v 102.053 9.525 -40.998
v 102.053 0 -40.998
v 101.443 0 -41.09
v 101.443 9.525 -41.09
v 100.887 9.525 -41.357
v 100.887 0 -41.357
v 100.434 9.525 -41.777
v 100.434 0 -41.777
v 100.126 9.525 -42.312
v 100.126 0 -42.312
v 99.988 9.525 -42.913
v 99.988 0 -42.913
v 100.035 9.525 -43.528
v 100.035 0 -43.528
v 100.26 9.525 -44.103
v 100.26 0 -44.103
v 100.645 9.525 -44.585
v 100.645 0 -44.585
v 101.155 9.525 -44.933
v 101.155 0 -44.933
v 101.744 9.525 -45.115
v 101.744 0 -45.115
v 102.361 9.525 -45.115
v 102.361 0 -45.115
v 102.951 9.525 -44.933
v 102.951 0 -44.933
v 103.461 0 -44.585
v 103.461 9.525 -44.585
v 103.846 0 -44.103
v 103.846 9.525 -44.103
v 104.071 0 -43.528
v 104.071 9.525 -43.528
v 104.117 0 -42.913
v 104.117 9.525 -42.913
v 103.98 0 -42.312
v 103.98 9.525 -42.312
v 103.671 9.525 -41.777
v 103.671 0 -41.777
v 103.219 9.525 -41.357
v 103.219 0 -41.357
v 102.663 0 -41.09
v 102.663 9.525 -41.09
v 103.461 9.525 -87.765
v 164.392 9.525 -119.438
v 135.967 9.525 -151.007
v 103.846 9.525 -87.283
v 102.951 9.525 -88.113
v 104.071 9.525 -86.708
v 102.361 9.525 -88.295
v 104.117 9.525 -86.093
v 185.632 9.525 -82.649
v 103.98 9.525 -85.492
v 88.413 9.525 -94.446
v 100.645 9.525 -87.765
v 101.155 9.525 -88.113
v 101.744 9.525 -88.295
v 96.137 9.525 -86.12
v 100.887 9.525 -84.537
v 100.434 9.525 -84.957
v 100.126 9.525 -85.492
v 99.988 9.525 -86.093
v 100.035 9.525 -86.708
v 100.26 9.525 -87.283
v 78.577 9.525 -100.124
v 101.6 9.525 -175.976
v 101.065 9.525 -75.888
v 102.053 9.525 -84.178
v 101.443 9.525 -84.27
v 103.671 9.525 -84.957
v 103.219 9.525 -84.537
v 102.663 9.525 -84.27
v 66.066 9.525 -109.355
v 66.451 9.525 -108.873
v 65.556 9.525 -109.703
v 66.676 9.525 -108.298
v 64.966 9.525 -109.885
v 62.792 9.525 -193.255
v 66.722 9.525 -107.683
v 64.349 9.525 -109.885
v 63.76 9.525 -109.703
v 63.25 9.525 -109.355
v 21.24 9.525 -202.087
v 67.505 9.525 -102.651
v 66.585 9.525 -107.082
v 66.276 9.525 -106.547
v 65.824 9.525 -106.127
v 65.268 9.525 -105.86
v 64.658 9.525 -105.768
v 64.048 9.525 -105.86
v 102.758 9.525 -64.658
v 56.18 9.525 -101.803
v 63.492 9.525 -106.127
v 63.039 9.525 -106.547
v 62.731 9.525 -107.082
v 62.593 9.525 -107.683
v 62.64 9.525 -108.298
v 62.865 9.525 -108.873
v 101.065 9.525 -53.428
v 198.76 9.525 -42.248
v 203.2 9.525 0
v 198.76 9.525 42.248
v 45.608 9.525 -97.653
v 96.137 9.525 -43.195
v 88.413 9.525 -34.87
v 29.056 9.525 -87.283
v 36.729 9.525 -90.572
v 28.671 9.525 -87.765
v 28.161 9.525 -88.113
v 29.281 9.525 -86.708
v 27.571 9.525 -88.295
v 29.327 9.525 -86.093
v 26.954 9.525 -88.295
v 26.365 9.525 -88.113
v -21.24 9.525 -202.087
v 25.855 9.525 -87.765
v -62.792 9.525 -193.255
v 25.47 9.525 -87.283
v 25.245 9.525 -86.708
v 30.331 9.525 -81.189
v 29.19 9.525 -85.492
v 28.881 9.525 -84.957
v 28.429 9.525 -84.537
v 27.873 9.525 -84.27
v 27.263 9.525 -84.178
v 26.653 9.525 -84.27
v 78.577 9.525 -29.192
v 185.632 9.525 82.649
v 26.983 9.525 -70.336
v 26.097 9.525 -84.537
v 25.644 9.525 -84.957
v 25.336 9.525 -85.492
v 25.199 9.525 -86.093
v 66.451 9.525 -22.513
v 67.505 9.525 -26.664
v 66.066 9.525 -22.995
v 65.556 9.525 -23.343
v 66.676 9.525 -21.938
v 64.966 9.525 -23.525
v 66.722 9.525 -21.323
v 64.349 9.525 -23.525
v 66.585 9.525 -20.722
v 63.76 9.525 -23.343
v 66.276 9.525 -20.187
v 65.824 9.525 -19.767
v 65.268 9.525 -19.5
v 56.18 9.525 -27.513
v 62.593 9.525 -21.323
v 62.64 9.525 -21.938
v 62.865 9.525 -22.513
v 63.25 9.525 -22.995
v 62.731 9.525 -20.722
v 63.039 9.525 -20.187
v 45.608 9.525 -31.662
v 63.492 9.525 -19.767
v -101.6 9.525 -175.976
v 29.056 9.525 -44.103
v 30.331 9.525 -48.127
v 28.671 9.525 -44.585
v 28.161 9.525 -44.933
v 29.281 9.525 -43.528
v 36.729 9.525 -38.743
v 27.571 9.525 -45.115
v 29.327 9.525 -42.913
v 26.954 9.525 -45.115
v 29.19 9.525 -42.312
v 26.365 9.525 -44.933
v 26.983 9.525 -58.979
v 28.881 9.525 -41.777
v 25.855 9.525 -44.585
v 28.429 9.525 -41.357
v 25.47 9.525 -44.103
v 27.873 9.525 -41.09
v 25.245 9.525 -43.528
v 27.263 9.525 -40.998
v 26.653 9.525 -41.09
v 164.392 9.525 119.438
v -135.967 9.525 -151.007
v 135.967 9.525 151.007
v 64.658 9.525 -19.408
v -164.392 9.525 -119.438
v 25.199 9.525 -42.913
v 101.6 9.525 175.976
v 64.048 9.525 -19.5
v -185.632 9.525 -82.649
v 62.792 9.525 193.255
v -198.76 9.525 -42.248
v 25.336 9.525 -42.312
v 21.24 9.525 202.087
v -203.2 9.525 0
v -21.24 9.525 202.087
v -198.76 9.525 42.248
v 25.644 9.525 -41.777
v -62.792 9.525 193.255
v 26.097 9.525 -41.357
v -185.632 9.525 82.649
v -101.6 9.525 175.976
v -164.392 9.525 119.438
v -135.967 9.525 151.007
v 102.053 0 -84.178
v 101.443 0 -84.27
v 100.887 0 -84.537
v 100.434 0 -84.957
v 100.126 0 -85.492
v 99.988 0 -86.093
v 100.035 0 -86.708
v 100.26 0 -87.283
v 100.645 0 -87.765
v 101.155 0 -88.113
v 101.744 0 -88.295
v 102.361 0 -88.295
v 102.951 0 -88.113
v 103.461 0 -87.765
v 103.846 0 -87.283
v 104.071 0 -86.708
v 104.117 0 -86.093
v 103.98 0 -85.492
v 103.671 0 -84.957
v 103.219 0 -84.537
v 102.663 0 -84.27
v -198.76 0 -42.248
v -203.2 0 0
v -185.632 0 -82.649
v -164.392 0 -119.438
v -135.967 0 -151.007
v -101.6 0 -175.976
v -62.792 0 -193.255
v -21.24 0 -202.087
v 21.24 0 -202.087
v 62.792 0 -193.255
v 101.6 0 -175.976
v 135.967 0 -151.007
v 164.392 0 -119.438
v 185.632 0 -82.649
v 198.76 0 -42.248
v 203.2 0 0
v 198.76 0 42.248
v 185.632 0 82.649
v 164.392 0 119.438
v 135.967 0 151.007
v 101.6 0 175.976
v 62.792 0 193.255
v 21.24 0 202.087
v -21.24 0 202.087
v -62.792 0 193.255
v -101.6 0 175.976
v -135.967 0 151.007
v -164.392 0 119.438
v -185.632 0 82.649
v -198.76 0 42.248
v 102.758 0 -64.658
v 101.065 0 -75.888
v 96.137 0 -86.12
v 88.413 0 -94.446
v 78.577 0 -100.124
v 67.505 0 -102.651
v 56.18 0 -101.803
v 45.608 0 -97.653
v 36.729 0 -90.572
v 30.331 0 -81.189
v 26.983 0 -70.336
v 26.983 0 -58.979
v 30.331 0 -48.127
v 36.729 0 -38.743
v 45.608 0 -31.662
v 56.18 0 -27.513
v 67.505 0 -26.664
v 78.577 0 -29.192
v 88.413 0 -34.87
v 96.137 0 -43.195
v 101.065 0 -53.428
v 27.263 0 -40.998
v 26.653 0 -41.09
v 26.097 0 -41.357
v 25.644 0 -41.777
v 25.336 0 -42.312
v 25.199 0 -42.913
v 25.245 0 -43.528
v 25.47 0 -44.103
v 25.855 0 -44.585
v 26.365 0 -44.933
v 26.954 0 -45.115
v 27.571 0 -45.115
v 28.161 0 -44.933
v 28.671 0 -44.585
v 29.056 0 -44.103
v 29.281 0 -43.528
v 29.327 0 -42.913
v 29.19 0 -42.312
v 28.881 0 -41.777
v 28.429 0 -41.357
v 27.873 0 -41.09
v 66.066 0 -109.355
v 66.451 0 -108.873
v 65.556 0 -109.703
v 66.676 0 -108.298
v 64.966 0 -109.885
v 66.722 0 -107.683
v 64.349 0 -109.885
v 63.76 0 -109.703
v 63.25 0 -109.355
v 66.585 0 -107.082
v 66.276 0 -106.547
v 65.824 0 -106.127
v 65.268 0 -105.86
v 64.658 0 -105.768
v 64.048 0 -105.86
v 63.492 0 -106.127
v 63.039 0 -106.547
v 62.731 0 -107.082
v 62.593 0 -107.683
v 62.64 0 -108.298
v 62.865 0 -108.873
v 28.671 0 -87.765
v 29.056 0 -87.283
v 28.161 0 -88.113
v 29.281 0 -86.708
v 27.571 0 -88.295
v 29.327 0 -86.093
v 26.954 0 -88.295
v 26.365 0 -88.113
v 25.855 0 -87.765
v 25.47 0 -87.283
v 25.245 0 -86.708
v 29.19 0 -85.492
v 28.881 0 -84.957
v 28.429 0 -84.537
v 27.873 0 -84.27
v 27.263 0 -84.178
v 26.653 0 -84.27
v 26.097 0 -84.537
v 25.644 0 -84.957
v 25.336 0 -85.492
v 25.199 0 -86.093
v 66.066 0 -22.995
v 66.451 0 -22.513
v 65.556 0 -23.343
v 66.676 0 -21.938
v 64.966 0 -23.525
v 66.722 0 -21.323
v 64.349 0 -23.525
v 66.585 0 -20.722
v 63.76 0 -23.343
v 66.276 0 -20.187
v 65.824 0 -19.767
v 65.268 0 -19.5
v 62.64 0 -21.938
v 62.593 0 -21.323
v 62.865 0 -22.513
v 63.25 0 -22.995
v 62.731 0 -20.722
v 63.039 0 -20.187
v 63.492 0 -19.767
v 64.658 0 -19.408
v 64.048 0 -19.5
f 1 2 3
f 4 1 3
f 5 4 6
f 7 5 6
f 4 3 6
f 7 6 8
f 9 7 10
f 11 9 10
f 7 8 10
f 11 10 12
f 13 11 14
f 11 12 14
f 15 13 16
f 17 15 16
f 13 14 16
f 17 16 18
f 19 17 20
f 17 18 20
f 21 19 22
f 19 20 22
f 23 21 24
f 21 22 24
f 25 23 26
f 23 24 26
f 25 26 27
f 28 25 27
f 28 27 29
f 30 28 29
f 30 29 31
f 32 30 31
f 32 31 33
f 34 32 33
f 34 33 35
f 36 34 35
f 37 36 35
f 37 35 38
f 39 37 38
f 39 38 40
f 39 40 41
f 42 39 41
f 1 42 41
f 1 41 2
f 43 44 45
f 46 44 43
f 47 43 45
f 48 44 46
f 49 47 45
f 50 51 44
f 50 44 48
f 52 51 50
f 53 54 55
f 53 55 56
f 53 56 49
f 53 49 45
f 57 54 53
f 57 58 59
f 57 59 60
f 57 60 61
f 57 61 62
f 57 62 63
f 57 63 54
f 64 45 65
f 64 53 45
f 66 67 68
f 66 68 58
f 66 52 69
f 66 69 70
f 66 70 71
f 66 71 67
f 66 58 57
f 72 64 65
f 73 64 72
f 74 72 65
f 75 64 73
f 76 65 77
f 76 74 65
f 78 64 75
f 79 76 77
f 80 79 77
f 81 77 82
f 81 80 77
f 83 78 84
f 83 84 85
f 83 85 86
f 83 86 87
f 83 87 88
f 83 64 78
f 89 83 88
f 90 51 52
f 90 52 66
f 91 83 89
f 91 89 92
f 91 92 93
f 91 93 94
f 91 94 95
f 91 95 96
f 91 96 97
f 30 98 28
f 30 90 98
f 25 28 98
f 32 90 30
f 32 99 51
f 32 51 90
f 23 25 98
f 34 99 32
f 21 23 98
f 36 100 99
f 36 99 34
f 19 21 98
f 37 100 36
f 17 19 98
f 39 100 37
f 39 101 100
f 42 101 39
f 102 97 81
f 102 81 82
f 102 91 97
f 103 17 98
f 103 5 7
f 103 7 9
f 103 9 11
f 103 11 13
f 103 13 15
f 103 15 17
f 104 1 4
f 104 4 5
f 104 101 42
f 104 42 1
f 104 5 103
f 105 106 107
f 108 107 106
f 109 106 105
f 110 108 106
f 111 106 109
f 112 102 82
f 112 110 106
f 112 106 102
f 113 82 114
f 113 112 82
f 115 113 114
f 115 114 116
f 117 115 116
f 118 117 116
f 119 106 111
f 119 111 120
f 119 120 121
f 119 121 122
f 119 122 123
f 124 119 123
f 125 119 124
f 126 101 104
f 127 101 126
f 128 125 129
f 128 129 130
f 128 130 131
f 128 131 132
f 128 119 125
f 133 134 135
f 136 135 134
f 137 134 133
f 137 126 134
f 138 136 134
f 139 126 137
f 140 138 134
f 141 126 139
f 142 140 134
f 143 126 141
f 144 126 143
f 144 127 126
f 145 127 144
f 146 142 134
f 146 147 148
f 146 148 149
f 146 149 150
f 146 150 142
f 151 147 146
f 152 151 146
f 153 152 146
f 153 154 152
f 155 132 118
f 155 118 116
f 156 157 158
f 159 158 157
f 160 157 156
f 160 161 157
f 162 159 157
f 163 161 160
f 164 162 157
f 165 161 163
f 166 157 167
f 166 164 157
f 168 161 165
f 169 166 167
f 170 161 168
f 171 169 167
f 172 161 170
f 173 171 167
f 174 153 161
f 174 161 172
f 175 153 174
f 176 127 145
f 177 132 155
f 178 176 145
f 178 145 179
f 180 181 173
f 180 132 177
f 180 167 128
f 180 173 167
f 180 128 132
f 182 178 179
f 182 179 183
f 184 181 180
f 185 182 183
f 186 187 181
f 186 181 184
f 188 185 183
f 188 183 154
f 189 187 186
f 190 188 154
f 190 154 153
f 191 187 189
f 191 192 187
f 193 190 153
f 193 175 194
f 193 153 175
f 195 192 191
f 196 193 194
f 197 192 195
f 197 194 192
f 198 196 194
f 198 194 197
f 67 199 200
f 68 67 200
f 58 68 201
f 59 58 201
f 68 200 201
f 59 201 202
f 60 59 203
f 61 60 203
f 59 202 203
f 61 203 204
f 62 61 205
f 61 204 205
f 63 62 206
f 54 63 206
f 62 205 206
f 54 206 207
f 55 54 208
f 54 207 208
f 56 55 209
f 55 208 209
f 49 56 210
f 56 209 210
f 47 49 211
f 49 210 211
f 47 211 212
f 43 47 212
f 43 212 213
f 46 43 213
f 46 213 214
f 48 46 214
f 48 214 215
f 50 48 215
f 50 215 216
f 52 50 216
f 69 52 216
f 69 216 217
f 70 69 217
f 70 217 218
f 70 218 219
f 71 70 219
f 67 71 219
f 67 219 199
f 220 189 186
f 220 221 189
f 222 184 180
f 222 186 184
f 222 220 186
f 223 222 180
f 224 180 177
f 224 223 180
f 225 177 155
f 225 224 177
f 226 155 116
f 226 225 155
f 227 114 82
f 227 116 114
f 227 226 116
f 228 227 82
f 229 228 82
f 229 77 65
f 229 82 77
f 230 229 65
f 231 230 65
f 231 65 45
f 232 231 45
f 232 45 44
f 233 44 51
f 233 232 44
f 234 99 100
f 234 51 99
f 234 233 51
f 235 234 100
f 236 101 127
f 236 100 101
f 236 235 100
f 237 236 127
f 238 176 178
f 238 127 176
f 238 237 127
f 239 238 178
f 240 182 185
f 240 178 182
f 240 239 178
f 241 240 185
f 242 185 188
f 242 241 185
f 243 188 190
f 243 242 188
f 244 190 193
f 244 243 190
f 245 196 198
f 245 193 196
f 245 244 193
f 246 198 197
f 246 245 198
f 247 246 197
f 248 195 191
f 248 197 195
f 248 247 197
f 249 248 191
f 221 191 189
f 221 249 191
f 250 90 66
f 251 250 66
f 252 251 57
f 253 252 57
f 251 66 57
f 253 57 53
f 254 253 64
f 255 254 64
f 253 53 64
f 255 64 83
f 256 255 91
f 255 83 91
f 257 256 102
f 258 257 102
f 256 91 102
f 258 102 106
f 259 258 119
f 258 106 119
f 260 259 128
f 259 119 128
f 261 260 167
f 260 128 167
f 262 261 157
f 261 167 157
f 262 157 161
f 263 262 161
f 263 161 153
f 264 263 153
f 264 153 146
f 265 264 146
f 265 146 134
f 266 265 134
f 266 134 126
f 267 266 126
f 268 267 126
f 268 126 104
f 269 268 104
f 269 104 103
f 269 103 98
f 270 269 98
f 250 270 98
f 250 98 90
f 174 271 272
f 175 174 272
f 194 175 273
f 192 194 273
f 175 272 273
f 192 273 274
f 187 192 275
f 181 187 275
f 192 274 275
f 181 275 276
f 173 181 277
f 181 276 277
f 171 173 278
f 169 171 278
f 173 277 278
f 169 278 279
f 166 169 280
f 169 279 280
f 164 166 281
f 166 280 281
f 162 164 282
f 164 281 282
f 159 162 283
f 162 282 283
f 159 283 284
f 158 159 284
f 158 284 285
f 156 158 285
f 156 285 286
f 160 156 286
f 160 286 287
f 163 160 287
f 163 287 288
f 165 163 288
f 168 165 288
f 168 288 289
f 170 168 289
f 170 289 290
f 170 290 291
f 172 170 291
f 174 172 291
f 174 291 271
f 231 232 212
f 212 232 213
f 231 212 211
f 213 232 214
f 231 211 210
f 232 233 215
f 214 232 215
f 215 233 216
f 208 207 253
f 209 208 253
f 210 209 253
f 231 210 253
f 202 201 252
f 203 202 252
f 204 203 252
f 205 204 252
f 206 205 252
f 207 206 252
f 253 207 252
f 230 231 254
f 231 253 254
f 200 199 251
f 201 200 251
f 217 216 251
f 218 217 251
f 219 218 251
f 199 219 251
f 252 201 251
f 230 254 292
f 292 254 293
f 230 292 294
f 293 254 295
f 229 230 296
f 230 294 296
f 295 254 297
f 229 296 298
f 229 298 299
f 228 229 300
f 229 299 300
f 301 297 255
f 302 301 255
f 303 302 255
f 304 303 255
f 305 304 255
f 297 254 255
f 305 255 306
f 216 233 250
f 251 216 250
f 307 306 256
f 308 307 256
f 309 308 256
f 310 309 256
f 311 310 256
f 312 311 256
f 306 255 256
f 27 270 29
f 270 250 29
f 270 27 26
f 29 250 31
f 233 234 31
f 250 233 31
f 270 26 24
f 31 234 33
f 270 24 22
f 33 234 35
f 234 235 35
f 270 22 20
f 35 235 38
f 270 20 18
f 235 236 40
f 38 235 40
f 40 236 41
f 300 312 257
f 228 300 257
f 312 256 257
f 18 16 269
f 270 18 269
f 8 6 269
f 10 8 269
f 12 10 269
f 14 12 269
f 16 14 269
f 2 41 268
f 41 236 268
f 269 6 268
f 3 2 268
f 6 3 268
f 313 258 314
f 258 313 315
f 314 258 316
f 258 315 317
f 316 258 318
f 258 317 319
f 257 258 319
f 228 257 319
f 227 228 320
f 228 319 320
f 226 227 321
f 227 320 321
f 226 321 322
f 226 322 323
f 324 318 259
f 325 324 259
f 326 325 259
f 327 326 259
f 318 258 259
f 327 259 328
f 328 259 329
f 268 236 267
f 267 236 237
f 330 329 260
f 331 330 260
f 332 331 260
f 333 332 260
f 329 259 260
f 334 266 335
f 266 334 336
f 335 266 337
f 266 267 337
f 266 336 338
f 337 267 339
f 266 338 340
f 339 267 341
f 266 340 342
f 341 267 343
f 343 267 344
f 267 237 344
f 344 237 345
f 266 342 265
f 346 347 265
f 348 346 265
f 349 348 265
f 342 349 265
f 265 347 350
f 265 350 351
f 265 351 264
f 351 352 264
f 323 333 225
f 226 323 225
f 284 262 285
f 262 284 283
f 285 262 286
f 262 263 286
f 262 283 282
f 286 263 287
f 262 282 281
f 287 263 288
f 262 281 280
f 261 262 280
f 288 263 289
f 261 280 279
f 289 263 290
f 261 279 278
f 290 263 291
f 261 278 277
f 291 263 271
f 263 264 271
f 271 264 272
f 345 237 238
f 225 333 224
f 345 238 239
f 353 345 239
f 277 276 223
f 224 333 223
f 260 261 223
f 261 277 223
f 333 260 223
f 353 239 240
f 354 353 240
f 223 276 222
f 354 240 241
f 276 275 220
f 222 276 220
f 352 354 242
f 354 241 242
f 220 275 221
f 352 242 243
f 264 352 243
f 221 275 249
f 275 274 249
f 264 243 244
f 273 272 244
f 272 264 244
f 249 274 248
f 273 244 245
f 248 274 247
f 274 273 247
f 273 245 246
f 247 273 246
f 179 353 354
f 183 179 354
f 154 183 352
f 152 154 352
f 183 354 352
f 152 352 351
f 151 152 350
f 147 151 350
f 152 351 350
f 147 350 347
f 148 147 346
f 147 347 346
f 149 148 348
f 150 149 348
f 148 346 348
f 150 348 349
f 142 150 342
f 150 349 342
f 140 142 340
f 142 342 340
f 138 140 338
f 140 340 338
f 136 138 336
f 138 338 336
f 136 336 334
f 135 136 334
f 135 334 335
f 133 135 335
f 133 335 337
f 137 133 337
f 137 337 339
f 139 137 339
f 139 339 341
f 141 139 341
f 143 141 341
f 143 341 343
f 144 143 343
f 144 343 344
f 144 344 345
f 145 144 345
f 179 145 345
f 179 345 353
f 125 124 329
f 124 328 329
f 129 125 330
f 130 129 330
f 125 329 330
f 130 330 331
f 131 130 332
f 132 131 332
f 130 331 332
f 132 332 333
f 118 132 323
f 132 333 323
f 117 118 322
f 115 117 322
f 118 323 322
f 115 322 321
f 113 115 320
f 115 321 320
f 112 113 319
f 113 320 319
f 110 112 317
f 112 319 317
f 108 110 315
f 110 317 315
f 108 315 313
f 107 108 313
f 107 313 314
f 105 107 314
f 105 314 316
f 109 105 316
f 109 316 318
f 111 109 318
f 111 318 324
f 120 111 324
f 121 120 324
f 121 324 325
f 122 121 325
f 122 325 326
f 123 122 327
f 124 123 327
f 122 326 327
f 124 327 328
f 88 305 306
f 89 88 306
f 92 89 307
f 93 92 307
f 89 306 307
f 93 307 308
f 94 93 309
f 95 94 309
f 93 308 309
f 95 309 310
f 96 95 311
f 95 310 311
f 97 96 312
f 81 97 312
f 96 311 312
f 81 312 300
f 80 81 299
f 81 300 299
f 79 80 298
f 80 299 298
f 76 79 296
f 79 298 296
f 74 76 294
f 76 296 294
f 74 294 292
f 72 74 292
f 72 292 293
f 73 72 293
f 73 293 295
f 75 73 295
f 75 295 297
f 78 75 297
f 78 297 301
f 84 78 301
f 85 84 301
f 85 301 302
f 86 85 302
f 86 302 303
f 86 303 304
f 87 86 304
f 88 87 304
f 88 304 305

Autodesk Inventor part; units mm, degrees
ref_plane "YZ Plane" through (0, 0, 0) normal (1, 0, 0) x (0, 1, 0)
ref_plane "XZ Plane" through (0, 0, 0) normal (0, 1, 0) x (-1, 0, 0)
ref_plane "XY Plane" through (0, 0, 0) normal (0, 0, 1) x (1, 0, 0)
sketch "Sketch1" plane through (0, 0, 0) normal (0, 1, 0) x (-1, 0, 0)
  circle A0 centre (0, 0) radius 203.2
  dimension "d0" = 406.4
extrude "Extrusion1" add sketch "Sketch1" along normal blind 9.525
sketch "Sketch2" plane through (0, 9.525, 0) normal (0, 1, 0) x (1, 0, 0)
  line L0 (0, 0) -> (64.6578, 64.6578) construction
  line L1 (0, 0) -> (91.44, 0) construction
  line L2 (64.6578, 64.6578) -> (102.0528, 86.2478)
  line L3 (64.6578, 64.6578) -> (107.8378, 64.6578) construction
  line L4 (64.6578, 64.6578) -> (64.6578, 107.8378)
  line L5 (64.6578, 64.6578) -> (27.2629, 86.2478)
  line L6 (64.6578, 64.6578) -> (27.2629, 43.0678)
  line L7 (64.6578, 64.6578) -> (64.6578, 21.4778)
  line L8 (64.6578, 64.6578) -> (102.0528, 43.0678)
  dimension "d3" = 91.44
  dimension "d4" = 45
  dimension "d5" = 43.18
  dimension "d6" = 30
  dimension "d9" = 360
hole "Hole1" at (64.6578, 9.525, -107.8378) at (27.2629, 9.525, -86.2478) at (27.2629, 9.525, -43.0678) at (102.0528, 9.525, -43.0678) at (102.0528, 9.525, -86.2478) at (64.6578, 9.525, -21.4778) direction (0, -1, 0) diameter 4.1402 end up to surface
sketch "Sketch3" plane through (0, 9.525, 0) normal (0, 1, 0) x (1, 0, 0)
  line L0 (0, 0) -> (64.6578, 64.6578) construction
  line L1 (0, 0) -> (91.44, 0) construction
  circle A0 centre (64.6578, 64.6578) radius 38.1
  dimension "d18" = 91.44
  dimension "d19" = 45
  dimension "d20" = 76.2
extrude "Extrusion2" cut sketch "Sketch3" against normal up to surface (9.525 mm away)
properties part number "2K8 stage" material "Copper"
